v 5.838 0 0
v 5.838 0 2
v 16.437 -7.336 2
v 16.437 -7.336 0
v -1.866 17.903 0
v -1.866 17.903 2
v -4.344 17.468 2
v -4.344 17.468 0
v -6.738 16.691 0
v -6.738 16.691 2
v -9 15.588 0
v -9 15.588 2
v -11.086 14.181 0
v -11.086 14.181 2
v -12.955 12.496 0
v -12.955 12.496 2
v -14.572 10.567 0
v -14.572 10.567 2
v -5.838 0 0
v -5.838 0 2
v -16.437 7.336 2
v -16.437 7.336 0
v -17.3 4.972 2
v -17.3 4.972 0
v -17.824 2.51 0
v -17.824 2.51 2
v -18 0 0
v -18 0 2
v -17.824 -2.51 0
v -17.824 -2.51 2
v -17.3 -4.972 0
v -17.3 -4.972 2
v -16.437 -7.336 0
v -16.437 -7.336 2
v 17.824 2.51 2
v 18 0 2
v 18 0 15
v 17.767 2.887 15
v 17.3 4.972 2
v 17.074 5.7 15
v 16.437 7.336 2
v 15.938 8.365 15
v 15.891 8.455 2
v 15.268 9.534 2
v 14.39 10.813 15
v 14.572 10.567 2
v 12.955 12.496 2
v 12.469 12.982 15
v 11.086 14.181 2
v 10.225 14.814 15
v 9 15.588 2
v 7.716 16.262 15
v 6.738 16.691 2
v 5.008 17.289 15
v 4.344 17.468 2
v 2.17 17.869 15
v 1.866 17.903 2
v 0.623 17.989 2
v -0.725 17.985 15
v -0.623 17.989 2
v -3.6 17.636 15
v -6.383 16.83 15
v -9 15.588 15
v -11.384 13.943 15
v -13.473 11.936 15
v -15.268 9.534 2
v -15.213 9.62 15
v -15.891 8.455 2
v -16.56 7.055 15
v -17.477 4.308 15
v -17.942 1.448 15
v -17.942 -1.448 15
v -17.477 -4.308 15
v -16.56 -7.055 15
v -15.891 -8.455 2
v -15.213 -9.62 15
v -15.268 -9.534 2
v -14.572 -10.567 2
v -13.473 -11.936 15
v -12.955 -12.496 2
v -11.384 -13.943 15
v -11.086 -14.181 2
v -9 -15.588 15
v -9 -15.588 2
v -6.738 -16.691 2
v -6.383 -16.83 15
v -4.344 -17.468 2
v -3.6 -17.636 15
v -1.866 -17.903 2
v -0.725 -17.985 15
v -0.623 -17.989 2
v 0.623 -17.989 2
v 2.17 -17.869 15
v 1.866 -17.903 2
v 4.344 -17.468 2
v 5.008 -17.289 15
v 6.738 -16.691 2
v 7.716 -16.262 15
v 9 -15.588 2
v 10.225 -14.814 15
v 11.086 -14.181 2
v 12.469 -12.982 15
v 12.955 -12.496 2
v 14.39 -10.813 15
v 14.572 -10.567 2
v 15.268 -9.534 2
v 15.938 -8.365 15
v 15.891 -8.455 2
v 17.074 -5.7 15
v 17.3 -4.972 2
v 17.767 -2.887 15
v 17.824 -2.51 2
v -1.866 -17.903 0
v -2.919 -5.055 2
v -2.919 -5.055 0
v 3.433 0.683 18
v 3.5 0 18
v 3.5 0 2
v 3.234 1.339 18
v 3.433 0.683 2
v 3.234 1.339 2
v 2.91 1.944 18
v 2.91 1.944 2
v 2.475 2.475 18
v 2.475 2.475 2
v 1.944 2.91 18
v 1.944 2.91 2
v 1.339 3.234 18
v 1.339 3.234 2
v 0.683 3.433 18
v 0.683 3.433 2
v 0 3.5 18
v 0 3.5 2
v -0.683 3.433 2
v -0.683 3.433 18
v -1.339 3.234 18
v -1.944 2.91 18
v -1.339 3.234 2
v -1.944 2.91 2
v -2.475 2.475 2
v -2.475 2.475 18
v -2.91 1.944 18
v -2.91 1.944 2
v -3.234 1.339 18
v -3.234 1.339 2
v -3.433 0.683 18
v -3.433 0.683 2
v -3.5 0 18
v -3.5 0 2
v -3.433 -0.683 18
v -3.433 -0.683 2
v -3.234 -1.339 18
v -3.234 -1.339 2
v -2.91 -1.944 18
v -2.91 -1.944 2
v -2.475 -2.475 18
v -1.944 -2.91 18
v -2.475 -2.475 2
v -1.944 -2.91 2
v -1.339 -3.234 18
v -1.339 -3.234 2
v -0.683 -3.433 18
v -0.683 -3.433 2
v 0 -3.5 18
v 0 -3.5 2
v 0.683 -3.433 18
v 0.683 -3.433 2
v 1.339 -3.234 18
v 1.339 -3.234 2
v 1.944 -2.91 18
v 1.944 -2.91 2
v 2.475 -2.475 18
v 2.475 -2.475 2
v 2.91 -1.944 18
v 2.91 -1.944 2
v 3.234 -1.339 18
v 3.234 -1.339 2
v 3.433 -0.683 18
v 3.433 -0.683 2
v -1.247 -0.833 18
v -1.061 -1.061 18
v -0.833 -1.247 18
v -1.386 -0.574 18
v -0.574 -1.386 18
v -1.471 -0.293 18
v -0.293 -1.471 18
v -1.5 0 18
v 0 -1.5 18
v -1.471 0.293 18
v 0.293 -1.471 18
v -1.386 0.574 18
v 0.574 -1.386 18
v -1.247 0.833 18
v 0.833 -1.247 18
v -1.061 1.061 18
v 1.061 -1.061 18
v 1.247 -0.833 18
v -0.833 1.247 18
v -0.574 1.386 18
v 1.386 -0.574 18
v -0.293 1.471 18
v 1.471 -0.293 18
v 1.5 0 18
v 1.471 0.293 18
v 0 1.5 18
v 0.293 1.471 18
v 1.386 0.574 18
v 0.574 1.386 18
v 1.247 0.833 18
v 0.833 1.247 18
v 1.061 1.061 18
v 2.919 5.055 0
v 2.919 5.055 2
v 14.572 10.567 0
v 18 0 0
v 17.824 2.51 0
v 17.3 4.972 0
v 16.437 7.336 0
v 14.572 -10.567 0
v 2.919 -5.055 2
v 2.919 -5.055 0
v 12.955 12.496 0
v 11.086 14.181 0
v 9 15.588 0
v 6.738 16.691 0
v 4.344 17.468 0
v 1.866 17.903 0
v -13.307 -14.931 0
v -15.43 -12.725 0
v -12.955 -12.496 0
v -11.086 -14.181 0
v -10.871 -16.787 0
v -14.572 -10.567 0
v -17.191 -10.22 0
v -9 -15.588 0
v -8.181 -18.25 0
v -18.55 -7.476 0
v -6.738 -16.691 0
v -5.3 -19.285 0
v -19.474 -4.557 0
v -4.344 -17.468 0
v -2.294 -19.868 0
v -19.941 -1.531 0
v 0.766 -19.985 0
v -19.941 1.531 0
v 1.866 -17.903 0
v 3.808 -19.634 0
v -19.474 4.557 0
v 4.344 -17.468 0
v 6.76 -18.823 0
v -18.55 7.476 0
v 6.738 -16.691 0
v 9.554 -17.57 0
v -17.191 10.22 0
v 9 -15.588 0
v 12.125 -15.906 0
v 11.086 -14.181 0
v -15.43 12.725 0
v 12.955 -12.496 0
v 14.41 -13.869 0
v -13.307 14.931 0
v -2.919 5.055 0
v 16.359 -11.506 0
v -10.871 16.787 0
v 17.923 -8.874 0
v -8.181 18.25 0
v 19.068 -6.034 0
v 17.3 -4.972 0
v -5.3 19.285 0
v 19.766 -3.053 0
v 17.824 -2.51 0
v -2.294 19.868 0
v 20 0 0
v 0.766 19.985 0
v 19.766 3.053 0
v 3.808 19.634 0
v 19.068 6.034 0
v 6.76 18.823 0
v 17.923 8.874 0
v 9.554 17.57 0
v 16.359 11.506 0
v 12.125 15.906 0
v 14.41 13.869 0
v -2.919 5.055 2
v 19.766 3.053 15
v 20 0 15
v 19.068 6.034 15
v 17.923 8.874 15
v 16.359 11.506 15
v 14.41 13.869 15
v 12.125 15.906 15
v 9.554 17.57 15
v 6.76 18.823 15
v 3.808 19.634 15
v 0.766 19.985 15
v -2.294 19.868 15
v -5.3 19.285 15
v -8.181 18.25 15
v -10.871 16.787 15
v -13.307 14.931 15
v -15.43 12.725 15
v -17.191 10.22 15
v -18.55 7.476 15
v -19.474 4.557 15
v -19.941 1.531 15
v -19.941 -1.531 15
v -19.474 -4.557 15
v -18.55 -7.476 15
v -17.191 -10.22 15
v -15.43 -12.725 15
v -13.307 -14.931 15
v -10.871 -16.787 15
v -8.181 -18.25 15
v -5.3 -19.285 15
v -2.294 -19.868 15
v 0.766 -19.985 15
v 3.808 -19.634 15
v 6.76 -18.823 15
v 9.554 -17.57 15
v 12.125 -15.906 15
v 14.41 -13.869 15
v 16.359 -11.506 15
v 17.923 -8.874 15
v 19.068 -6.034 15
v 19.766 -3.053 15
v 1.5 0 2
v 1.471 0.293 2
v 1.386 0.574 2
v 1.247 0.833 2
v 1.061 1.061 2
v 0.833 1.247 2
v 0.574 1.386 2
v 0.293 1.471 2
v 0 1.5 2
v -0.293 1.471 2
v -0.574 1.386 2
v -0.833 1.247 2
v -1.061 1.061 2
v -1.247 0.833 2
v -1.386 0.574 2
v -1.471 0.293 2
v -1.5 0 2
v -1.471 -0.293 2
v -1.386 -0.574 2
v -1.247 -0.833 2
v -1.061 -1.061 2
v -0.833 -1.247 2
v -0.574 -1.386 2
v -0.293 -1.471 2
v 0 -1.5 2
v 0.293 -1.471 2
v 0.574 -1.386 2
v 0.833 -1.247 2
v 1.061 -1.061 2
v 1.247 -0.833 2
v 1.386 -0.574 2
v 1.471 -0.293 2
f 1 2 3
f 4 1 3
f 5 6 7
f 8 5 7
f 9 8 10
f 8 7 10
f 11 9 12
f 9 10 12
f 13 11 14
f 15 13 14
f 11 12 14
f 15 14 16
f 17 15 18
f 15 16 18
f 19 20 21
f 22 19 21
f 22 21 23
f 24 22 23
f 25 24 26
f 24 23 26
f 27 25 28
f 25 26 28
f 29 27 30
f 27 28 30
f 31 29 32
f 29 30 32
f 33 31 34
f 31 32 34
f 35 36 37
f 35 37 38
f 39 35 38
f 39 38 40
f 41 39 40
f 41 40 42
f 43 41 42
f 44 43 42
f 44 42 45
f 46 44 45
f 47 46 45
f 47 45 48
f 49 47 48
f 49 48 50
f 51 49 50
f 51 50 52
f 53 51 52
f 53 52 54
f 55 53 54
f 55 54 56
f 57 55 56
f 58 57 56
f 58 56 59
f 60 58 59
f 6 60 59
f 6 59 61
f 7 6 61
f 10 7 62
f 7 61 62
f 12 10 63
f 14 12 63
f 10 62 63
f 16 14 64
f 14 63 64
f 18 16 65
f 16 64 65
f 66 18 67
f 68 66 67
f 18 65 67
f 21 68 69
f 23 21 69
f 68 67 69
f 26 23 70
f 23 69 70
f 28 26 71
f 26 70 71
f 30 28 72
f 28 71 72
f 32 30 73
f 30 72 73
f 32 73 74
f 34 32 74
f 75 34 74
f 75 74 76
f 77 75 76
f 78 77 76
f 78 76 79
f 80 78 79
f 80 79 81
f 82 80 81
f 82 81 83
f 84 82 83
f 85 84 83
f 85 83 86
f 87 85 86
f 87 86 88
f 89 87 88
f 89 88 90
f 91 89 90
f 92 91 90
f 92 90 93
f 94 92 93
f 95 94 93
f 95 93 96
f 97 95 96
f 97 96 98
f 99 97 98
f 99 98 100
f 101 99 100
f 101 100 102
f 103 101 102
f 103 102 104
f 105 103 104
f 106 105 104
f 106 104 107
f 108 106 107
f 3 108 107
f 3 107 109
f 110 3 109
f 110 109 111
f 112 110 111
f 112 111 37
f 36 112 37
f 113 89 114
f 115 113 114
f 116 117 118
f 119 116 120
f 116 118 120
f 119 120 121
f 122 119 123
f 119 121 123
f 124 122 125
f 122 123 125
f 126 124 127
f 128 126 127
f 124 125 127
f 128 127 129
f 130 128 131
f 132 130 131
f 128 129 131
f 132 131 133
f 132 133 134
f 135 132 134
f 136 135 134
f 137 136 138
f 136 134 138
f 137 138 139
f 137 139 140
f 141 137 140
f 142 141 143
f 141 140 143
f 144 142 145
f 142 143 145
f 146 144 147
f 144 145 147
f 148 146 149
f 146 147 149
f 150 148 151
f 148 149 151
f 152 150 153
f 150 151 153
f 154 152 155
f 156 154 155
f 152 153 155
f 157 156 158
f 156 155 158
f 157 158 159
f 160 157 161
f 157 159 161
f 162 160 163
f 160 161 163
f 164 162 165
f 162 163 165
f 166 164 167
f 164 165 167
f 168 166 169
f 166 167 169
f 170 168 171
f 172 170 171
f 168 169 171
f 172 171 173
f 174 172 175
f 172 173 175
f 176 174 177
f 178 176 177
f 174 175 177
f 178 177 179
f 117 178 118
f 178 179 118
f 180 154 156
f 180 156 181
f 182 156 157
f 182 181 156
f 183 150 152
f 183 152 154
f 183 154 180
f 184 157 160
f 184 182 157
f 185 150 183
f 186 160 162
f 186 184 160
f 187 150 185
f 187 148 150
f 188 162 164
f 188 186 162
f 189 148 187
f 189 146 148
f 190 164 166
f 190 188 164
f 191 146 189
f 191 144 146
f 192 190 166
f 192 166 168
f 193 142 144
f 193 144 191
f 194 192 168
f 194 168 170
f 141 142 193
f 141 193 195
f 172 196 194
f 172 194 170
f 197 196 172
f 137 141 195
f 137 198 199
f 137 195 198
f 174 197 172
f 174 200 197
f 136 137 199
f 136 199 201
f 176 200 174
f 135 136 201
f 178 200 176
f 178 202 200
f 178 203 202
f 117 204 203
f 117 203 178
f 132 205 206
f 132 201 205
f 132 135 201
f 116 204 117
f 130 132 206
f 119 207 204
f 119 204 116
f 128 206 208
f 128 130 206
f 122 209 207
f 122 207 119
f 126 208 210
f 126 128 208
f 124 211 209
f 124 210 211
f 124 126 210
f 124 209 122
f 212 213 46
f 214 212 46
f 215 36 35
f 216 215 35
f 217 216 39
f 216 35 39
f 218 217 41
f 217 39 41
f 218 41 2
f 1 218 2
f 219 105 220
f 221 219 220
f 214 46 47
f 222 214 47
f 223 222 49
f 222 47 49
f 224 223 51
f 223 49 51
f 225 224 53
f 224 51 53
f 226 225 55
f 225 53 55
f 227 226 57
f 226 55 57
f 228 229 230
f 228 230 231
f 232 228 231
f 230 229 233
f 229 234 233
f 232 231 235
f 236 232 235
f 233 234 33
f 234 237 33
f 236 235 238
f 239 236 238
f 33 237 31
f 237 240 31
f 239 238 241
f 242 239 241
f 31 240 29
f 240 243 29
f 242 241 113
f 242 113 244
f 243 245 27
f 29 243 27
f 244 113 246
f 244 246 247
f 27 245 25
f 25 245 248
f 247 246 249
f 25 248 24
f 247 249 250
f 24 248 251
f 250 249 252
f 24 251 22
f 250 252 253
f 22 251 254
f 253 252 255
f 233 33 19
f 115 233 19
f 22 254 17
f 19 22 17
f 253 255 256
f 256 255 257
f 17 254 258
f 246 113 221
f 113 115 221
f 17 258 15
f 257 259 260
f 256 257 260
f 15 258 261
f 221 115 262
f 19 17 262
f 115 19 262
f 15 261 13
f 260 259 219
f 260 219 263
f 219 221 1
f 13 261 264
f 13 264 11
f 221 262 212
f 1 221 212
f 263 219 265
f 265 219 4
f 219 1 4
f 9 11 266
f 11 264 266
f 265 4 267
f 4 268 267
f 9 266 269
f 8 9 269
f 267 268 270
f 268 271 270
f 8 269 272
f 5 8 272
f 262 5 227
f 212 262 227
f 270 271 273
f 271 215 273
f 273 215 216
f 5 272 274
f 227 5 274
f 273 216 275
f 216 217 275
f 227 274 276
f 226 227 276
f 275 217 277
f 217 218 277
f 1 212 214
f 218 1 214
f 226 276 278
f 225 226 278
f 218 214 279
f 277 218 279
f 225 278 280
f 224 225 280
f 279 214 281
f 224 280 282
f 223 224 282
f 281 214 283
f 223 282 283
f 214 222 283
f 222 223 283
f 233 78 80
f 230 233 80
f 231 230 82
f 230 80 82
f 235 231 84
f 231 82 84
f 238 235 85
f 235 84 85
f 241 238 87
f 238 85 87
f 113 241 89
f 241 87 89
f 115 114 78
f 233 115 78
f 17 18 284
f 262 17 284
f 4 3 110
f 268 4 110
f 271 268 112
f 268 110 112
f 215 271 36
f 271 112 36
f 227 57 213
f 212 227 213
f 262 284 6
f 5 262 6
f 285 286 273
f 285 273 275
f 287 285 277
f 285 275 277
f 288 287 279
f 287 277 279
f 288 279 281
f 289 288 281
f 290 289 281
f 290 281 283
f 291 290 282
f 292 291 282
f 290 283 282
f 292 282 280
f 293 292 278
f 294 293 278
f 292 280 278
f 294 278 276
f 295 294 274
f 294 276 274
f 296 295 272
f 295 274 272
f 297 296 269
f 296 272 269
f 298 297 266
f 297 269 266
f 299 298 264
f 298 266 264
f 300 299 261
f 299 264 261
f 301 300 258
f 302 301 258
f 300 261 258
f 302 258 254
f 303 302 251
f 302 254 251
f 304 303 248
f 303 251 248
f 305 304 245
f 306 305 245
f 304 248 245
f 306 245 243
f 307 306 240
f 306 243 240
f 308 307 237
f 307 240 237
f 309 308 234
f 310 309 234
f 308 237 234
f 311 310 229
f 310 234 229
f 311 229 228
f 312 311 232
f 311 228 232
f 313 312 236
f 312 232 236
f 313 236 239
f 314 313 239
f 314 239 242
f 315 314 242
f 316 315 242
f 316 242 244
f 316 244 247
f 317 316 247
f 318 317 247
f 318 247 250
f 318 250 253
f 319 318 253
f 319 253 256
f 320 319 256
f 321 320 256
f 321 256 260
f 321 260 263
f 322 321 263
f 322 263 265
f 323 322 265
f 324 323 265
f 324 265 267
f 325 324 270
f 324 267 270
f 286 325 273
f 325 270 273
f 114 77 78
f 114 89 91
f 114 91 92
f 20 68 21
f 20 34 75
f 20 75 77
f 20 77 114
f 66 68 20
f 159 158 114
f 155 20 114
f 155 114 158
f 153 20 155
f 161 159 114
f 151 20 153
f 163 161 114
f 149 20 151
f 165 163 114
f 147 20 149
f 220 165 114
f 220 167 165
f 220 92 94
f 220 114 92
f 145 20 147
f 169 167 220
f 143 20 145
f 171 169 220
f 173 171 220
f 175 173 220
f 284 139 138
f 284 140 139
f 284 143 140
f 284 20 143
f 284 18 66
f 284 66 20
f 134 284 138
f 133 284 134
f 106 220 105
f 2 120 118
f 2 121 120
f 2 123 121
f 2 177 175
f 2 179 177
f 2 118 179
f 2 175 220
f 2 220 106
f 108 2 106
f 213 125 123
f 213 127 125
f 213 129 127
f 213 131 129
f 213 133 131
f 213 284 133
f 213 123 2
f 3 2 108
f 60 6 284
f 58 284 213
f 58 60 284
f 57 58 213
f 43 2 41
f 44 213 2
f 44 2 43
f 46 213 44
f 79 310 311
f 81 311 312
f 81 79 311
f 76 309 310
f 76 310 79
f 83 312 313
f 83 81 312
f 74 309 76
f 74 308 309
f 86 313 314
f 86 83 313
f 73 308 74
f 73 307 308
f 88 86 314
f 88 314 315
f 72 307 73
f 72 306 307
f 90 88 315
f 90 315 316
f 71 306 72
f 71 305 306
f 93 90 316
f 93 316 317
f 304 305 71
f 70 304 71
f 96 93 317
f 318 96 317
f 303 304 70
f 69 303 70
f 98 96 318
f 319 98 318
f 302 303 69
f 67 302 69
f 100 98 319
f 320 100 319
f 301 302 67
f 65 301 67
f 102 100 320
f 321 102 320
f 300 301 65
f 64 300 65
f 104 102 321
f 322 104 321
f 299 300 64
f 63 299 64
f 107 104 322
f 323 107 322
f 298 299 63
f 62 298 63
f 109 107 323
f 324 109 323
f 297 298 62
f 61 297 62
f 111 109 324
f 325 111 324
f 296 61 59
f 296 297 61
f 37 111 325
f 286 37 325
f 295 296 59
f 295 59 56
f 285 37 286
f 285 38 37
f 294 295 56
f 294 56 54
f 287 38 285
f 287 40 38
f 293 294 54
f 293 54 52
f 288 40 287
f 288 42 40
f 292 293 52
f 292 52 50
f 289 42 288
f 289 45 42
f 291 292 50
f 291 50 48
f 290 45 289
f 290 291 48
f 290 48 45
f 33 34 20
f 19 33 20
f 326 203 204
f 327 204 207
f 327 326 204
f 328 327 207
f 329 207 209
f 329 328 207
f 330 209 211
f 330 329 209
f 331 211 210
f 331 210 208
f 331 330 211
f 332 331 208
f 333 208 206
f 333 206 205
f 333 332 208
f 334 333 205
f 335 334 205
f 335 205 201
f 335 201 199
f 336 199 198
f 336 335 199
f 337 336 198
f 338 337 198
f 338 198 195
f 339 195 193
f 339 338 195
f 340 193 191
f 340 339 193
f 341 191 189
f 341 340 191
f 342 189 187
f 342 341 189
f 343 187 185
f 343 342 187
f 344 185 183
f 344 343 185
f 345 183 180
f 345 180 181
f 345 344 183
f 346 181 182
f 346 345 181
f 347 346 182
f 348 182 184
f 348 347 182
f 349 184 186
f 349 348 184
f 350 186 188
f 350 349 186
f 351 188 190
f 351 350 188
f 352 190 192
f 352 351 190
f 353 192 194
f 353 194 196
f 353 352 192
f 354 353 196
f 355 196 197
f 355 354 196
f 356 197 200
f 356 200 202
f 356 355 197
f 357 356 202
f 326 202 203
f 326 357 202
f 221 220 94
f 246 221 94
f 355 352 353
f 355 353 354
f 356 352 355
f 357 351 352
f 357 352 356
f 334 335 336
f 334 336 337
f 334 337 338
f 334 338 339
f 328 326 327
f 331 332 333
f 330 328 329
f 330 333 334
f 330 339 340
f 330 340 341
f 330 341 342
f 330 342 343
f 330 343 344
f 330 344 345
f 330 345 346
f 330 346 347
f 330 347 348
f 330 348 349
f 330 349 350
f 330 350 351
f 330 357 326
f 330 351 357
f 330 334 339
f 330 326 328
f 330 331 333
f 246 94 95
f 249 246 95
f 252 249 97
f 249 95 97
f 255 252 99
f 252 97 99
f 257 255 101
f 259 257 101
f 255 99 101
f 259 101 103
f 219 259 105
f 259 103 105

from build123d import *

# Parameters (mm, degrees)
F0_R     = 20
F1_DEPTH = 15
F2_R     = 18
F3_DEPTH = 13
F4_R     = 3.5
F4_R_2   = 1.5
F5_DEPTH = 16
F7_DEPTH = 2


with BuildPart() as f1:
    # F0 (on Top) → F1 (new body)
    with BuildSketch(Plane.XY):
        Circle(F0_R)
    extrude(amount=F1_DEPTH)

    # F2 (on face) → F3 (cut)
    with BuildSketch(Plane.XY.offset(15)):
        Circle(F2_R)
    extrude(amount=-F3_DEPTH, mode=Mode.SUBTRACT)

    # F4 (on face) → F5 (join)
    with BuildSketch(Plane.XY.offset(2)):
        Circle(F4_R)
        Circle(F4_R_2, mode=Mode.SUBTRACT)
    extrude(amount=F5_DEPTH)

    # F6 (on face) → F7 (cut)
    with BuildSketch(Plane.XY.offset(2)):
        with BuildLine():
            Line((-2.9187702811, 5.0554584226), (-1.8657855341, 17.9030400866))
            ThreePointArc((-1.8657855341, 17.9030400866), (-9, 15.5884572681), (-14.5715947529, 10.5673377138))
            Line((-14.5715947529, 10.5673377138), (-2.9187702811, 5.0554584226))
        make_face()
        with BuildLine():
            ThreePointArc((14.5715947529, 10.5673377138), (9, 15.5884572681), (1.8657855341, 17.9030400866))
            Line((1.8657855341, 17.9030400866), (2.9187702811, 5.0554584226))
            Line((2.9187702811, 5.0554584226), (14.5715947529, 10.5673377138))
        make_face()
        with BuildLine():
            ThreePointArc((18, 0), (17.6050112918, 3.7501436529), (16.437380287, 7.3357023728))
            Line((16.437380287, 7.3357023728), (5.8375405623, 0))
            Line((5.8375405623, 0), (16.437380287, -7.3357023728))
            ThreePointArc((16.437380287, -7.3357023728), (17.6050112918, -3.7501436529), (18, 0))
        make_face()
        with BuildLine():
            ThreePointArc((1.8657855341, -17.9030400866), (9, -15.5884572681), (14.5715947529, -10.5673377138))
            Line((14.5715947529, -10.5673377138), (2.9187702811, -5.0554584226))
            Line((2.9187702811, -5.0554584226), (1.8657855341, -17.9030400866))
        make_face()
        with BuildLine():
            Line((-2.9187702811, -5.0554584226), (-14.5715947529, -10.5673377138))
            ThreePointArc((-14.5715947529, -10.5673377138), (-9, -15.5884572681), (-1.8657855341, -17.9030400866))
            Line((-1.8657855341, -17.9030400866), (-2.9187702811, -5.0554584226))
        make_face()
        with BuildLine():
            Line((-5.8375405623, 0), (-16.437380287, 7.3357023728))
            ThreePointArc((-16.437380287, 7.3357023728), (-18, 0), (-16.437380287, -7.3357023728))
            Line((-16.437380287, -7.3357023728), (-5.8375405623, 0))
        make_face()
    extrude(amount=-F7_DEPTH, mode=Mode.SUBTRACT)


solid = f1.part
